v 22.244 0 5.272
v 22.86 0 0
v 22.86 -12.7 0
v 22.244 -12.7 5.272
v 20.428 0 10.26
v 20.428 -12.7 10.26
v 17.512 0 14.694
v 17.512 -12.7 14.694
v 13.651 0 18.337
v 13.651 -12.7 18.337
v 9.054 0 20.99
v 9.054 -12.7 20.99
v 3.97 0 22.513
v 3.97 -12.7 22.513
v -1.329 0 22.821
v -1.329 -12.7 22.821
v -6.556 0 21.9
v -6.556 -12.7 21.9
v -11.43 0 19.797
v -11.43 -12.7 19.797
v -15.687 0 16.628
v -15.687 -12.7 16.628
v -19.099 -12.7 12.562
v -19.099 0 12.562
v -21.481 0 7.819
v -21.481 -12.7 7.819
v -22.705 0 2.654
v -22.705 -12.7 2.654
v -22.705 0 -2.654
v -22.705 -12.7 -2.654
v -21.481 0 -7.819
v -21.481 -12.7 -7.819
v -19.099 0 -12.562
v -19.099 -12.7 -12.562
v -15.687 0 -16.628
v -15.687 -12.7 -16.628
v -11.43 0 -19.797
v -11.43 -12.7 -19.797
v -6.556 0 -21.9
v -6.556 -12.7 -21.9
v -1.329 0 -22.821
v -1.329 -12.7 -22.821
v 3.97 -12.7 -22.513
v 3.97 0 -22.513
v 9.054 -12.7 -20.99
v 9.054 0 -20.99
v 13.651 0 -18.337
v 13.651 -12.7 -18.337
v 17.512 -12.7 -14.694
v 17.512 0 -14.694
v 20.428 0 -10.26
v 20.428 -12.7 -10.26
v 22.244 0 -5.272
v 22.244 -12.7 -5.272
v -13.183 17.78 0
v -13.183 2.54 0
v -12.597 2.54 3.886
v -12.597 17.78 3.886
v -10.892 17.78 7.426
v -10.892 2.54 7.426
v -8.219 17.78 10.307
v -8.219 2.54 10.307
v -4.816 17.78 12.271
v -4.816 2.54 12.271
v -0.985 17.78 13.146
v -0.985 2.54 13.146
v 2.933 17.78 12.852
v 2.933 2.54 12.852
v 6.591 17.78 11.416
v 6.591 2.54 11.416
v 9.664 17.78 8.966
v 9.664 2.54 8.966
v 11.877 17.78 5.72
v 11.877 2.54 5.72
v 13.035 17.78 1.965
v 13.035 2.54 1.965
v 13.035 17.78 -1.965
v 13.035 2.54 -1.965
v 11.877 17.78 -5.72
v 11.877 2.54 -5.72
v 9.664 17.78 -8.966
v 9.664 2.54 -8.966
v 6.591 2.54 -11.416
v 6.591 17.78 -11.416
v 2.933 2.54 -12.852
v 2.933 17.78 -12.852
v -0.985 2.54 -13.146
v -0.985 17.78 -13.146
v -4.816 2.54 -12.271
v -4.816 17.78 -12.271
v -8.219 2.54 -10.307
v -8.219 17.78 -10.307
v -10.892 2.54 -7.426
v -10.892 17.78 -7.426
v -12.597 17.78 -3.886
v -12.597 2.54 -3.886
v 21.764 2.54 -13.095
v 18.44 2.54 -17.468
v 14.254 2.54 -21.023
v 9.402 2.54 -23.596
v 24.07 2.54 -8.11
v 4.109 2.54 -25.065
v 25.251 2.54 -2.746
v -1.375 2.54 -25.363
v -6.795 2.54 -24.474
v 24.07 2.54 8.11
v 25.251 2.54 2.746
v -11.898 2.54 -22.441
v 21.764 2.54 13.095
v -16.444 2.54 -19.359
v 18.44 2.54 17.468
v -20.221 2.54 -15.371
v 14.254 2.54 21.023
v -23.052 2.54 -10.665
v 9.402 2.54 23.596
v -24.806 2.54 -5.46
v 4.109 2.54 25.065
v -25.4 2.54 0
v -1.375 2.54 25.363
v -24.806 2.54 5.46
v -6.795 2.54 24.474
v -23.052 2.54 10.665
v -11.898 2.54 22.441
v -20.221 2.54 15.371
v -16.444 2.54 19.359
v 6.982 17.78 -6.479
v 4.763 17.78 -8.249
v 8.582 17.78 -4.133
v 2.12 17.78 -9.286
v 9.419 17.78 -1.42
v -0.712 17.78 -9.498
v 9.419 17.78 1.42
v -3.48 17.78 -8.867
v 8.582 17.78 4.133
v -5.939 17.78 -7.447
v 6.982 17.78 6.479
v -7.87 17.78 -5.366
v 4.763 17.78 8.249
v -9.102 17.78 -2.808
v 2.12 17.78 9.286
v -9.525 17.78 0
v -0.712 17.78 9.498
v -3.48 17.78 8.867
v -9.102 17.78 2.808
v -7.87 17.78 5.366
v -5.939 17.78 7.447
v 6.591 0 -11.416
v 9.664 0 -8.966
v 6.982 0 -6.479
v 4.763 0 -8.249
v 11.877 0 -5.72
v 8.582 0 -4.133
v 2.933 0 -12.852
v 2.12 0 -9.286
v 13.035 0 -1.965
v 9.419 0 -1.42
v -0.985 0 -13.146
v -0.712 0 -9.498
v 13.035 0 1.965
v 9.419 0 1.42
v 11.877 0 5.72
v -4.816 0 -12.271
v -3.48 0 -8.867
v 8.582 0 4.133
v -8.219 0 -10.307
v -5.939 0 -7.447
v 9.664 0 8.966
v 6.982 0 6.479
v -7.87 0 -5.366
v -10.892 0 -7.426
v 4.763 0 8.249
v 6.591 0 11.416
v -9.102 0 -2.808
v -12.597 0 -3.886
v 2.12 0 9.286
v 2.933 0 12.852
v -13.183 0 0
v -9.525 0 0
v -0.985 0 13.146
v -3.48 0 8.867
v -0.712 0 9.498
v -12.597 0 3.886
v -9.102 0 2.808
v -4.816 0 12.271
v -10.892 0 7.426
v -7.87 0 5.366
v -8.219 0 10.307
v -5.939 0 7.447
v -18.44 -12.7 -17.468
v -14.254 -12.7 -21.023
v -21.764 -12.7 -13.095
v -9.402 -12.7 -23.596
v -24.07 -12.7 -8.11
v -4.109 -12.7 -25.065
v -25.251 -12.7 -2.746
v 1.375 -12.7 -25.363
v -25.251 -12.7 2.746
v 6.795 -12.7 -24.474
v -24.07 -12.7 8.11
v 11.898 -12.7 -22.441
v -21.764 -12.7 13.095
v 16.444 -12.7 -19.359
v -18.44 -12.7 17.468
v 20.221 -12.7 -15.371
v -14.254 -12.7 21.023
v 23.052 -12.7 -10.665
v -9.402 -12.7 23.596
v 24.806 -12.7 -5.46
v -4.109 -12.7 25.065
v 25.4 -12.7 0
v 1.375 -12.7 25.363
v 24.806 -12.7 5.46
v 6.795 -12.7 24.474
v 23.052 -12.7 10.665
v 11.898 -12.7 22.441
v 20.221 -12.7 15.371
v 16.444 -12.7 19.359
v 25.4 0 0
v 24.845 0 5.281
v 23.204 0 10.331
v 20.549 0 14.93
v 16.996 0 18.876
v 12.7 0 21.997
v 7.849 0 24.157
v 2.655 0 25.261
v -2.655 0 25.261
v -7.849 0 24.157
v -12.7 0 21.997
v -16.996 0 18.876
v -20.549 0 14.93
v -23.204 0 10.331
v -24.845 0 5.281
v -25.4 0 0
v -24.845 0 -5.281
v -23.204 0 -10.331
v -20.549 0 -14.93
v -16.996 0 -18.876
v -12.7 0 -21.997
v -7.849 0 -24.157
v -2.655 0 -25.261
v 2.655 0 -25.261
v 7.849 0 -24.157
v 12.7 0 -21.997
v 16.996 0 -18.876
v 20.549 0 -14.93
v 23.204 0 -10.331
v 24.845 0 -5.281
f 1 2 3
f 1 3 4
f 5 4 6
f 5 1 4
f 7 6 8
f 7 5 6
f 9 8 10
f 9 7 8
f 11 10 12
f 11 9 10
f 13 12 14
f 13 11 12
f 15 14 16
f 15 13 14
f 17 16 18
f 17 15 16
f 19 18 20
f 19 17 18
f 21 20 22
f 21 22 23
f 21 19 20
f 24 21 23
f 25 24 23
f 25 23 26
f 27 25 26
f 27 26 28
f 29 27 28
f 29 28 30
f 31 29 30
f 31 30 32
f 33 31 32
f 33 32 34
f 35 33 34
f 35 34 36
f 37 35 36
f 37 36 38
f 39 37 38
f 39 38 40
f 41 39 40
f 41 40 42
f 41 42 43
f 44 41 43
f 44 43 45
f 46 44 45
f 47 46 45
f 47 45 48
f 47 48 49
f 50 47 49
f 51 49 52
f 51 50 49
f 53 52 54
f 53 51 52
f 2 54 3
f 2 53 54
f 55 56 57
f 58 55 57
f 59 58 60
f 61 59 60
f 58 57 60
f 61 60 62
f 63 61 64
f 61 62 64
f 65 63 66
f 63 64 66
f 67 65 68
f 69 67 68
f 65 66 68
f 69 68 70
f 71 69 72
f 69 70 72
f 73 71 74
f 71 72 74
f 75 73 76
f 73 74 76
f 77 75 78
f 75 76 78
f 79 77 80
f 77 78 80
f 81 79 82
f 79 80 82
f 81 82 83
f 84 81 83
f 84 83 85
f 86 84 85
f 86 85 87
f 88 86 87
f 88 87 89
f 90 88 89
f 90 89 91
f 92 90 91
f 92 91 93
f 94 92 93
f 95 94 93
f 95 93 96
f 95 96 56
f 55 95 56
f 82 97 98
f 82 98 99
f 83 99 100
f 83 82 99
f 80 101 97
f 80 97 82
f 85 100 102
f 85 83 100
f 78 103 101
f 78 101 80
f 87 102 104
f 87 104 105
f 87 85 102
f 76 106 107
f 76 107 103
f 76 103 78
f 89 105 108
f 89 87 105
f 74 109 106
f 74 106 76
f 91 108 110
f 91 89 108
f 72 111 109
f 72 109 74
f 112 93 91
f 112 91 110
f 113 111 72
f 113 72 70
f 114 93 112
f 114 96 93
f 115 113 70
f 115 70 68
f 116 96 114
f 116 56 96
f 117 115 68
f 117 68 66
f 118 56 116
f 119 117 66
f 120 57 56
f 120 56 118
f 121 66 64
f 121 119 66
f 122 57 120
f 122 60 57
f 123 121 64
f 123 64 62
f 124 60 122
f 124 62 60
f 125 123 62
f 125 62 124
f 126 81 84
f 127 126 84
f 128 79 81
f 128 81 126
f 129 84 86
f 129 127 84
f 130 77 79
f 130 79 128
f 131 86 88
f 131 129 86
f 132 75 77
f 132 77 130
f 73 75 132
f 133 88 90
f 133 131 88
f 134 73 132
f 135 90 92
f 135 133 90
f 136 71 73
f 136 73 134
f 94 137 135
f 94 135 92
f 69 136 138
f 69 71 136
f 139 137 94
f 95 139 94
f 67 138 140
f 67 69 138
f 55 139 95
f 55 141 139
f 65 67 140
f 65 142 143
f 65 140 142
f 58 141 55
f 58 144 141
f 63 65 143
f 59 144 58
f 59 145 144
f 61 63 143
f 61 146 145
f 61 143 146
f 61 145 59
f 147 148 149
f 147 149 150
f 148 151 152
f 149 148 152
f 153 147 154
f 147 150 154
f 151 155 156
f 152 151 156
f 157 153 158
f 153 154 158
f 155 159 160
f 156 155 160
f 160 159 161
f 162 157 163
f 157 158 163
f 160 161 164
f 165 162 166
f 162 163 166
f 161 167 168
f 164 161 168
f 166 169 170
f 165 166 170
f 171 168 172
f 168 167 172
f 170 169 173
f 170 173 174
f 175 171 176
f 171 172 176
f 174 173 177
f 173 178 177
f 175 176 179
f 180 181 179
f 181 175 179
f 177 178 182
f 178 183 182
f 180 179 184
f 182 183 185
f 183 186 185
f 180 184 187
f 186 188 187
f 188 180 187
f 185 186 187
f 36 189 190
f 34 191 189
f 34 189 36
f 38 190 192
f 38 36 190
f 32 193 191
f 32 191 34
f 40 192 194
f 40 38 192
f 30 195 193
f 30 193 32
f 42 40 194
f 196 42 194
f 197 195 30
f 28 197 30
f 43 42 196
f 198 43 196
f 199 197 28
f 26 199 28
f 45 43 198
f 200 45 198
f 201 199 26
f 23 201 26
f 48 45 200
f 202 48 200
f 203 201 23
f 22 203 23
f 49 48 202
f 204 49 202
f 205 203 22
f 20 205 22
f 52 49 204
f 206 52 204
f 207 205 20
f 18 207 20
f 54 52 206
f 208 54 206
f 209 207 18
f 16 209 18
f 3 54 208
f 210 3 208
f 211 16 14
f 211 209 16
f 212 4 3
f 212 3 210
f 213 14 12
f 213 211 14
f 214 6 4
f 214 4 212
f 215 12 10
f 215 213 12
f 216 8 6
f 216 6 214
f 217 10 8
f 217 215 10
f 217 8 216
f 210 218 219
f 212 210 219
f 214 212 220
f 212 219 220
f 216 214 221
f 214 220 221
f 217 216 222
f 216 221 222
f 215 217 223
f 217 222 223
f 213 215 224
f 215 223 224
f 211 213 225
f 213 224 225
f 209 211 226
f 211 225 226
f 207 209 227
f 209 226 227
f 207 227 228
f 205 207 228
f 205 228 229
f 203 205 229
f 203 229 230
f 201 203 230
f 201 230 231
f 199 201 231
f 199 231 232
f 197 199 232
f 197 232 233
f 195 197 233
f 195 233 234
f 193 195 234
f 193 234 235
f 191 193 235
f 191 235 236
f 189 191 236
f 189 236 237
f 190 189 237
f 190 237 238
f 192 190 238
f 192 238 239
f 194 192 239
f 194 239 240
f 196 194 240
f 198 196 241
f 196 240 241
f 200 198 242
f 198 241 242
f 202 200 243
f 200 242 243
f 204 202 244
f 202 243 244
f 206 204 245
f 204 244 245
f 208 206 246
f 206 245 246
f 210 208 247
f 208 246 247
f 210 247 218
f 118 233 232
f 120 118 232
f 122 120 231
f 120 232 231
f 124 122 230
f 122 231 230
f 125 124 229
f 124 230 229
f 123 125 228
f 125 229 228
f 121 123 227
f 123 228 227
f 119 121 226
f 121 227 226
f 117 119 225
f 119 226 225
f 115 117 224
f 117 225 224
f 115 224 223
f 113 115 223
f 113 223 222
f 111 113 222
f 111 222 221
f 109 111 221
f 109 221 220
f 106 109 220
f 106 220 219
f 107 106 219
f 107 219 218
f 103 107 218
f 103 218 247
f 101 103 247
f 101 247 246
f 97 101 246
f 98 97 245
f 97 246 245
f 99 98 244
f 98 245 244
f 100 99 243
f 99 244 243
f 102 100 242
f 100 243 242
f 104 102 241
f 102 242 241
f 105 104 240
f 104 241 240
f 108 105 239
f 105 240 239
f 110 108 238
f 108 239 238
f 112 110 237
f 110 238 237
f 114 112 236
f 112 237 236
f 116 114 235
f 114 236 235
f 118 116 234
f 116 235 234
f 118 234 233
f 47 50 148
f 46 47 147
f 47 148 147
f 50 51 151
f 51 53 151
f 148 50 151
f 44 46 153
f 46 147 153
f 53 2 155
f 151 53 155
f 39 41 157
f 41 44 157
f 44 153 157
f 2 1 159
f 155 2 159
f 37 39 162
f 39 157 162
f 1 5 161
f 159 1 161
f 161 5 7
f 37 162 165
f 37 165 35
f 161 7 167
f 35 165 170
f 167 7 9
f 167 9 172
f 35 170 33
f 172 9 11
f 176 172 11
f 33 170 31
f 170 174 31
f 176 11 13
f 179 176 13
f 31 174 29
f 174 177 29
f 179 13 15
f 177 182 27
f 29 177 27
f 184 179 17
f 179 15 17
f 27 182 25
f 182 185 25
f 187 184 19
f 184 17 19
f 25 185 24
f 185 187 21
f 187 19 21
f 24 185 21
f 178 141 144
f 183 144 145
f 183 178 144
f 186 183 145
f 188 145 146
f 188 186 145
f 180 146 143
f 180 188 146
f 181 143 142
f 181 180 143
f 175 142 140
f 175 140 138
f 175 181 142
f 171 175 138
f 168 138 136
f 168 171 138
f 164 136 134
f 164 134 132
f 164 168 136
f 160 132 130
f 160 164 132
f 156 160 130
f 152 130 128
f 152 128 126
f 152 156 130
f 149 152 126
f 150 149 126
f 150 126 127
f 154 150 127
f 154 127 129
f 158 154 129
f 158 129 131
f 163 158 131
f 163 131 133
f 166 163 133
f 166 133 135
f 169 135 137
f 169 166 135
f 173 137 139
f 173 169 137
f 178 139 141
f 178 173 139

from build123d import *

# Parameters (mm, degrees)
F0_R     = 25.4
F0_R_2   = 22.86
F1_DEPTH = 3.81
F2_DEPTH = 12.7
F3_R     = 25.4
F3_R_2   = 22.86
F3_R_3   = 13.1826
F4_DEPTH = 2.54
F3_R_4   = 9.525
F5_DEPTH = 17.78


with BuildPart() as f1:
    # F0 (on Front) → F1 (new body)
    with BuildSketch(Plane.XZ):
        Circle(F0_R)
        Circle(F0_R_2, mode=Mode.SUBTRACT)
    extrude(amount=F1_DEPTH)

    # F0 (on Front) → F2 (join)
    with BuildSketch(Plane.XZ):
        Circle(F0_R)
        Circle(F0_R_2, mode=Mode.SUBTRACT)
    extrude(amount=F2_DEPTH)

    # F3 (on face) → F4 (join)
    with BuildSketch(Plane(origin=(0, 0, 0), x_dir=(-1, 0, 0), z_dir=(0, 1, 0))):
        Circle(F3_R)
        Circle(F3_R_2, mode=Mode.SUBTRACT)
        Circle(F3_R_2)
        Circle(F3_R_3, mode=Mode.SUBTRACT)
    extrude(amount=F4_DEPTH)

    # F3 (on face) → F5 (join)
    with BuildSketch(Plane(origin=(0, 0, 0), x_dir=(-1, 0, 0), z_dir=(0, 1, 0))):
        Circle(F3_R_3)
        Circle(F3_R_4, mode=Mode.SUBTRACT)
    extrude(amount=F5_DEPTH)


solid = f1.part
